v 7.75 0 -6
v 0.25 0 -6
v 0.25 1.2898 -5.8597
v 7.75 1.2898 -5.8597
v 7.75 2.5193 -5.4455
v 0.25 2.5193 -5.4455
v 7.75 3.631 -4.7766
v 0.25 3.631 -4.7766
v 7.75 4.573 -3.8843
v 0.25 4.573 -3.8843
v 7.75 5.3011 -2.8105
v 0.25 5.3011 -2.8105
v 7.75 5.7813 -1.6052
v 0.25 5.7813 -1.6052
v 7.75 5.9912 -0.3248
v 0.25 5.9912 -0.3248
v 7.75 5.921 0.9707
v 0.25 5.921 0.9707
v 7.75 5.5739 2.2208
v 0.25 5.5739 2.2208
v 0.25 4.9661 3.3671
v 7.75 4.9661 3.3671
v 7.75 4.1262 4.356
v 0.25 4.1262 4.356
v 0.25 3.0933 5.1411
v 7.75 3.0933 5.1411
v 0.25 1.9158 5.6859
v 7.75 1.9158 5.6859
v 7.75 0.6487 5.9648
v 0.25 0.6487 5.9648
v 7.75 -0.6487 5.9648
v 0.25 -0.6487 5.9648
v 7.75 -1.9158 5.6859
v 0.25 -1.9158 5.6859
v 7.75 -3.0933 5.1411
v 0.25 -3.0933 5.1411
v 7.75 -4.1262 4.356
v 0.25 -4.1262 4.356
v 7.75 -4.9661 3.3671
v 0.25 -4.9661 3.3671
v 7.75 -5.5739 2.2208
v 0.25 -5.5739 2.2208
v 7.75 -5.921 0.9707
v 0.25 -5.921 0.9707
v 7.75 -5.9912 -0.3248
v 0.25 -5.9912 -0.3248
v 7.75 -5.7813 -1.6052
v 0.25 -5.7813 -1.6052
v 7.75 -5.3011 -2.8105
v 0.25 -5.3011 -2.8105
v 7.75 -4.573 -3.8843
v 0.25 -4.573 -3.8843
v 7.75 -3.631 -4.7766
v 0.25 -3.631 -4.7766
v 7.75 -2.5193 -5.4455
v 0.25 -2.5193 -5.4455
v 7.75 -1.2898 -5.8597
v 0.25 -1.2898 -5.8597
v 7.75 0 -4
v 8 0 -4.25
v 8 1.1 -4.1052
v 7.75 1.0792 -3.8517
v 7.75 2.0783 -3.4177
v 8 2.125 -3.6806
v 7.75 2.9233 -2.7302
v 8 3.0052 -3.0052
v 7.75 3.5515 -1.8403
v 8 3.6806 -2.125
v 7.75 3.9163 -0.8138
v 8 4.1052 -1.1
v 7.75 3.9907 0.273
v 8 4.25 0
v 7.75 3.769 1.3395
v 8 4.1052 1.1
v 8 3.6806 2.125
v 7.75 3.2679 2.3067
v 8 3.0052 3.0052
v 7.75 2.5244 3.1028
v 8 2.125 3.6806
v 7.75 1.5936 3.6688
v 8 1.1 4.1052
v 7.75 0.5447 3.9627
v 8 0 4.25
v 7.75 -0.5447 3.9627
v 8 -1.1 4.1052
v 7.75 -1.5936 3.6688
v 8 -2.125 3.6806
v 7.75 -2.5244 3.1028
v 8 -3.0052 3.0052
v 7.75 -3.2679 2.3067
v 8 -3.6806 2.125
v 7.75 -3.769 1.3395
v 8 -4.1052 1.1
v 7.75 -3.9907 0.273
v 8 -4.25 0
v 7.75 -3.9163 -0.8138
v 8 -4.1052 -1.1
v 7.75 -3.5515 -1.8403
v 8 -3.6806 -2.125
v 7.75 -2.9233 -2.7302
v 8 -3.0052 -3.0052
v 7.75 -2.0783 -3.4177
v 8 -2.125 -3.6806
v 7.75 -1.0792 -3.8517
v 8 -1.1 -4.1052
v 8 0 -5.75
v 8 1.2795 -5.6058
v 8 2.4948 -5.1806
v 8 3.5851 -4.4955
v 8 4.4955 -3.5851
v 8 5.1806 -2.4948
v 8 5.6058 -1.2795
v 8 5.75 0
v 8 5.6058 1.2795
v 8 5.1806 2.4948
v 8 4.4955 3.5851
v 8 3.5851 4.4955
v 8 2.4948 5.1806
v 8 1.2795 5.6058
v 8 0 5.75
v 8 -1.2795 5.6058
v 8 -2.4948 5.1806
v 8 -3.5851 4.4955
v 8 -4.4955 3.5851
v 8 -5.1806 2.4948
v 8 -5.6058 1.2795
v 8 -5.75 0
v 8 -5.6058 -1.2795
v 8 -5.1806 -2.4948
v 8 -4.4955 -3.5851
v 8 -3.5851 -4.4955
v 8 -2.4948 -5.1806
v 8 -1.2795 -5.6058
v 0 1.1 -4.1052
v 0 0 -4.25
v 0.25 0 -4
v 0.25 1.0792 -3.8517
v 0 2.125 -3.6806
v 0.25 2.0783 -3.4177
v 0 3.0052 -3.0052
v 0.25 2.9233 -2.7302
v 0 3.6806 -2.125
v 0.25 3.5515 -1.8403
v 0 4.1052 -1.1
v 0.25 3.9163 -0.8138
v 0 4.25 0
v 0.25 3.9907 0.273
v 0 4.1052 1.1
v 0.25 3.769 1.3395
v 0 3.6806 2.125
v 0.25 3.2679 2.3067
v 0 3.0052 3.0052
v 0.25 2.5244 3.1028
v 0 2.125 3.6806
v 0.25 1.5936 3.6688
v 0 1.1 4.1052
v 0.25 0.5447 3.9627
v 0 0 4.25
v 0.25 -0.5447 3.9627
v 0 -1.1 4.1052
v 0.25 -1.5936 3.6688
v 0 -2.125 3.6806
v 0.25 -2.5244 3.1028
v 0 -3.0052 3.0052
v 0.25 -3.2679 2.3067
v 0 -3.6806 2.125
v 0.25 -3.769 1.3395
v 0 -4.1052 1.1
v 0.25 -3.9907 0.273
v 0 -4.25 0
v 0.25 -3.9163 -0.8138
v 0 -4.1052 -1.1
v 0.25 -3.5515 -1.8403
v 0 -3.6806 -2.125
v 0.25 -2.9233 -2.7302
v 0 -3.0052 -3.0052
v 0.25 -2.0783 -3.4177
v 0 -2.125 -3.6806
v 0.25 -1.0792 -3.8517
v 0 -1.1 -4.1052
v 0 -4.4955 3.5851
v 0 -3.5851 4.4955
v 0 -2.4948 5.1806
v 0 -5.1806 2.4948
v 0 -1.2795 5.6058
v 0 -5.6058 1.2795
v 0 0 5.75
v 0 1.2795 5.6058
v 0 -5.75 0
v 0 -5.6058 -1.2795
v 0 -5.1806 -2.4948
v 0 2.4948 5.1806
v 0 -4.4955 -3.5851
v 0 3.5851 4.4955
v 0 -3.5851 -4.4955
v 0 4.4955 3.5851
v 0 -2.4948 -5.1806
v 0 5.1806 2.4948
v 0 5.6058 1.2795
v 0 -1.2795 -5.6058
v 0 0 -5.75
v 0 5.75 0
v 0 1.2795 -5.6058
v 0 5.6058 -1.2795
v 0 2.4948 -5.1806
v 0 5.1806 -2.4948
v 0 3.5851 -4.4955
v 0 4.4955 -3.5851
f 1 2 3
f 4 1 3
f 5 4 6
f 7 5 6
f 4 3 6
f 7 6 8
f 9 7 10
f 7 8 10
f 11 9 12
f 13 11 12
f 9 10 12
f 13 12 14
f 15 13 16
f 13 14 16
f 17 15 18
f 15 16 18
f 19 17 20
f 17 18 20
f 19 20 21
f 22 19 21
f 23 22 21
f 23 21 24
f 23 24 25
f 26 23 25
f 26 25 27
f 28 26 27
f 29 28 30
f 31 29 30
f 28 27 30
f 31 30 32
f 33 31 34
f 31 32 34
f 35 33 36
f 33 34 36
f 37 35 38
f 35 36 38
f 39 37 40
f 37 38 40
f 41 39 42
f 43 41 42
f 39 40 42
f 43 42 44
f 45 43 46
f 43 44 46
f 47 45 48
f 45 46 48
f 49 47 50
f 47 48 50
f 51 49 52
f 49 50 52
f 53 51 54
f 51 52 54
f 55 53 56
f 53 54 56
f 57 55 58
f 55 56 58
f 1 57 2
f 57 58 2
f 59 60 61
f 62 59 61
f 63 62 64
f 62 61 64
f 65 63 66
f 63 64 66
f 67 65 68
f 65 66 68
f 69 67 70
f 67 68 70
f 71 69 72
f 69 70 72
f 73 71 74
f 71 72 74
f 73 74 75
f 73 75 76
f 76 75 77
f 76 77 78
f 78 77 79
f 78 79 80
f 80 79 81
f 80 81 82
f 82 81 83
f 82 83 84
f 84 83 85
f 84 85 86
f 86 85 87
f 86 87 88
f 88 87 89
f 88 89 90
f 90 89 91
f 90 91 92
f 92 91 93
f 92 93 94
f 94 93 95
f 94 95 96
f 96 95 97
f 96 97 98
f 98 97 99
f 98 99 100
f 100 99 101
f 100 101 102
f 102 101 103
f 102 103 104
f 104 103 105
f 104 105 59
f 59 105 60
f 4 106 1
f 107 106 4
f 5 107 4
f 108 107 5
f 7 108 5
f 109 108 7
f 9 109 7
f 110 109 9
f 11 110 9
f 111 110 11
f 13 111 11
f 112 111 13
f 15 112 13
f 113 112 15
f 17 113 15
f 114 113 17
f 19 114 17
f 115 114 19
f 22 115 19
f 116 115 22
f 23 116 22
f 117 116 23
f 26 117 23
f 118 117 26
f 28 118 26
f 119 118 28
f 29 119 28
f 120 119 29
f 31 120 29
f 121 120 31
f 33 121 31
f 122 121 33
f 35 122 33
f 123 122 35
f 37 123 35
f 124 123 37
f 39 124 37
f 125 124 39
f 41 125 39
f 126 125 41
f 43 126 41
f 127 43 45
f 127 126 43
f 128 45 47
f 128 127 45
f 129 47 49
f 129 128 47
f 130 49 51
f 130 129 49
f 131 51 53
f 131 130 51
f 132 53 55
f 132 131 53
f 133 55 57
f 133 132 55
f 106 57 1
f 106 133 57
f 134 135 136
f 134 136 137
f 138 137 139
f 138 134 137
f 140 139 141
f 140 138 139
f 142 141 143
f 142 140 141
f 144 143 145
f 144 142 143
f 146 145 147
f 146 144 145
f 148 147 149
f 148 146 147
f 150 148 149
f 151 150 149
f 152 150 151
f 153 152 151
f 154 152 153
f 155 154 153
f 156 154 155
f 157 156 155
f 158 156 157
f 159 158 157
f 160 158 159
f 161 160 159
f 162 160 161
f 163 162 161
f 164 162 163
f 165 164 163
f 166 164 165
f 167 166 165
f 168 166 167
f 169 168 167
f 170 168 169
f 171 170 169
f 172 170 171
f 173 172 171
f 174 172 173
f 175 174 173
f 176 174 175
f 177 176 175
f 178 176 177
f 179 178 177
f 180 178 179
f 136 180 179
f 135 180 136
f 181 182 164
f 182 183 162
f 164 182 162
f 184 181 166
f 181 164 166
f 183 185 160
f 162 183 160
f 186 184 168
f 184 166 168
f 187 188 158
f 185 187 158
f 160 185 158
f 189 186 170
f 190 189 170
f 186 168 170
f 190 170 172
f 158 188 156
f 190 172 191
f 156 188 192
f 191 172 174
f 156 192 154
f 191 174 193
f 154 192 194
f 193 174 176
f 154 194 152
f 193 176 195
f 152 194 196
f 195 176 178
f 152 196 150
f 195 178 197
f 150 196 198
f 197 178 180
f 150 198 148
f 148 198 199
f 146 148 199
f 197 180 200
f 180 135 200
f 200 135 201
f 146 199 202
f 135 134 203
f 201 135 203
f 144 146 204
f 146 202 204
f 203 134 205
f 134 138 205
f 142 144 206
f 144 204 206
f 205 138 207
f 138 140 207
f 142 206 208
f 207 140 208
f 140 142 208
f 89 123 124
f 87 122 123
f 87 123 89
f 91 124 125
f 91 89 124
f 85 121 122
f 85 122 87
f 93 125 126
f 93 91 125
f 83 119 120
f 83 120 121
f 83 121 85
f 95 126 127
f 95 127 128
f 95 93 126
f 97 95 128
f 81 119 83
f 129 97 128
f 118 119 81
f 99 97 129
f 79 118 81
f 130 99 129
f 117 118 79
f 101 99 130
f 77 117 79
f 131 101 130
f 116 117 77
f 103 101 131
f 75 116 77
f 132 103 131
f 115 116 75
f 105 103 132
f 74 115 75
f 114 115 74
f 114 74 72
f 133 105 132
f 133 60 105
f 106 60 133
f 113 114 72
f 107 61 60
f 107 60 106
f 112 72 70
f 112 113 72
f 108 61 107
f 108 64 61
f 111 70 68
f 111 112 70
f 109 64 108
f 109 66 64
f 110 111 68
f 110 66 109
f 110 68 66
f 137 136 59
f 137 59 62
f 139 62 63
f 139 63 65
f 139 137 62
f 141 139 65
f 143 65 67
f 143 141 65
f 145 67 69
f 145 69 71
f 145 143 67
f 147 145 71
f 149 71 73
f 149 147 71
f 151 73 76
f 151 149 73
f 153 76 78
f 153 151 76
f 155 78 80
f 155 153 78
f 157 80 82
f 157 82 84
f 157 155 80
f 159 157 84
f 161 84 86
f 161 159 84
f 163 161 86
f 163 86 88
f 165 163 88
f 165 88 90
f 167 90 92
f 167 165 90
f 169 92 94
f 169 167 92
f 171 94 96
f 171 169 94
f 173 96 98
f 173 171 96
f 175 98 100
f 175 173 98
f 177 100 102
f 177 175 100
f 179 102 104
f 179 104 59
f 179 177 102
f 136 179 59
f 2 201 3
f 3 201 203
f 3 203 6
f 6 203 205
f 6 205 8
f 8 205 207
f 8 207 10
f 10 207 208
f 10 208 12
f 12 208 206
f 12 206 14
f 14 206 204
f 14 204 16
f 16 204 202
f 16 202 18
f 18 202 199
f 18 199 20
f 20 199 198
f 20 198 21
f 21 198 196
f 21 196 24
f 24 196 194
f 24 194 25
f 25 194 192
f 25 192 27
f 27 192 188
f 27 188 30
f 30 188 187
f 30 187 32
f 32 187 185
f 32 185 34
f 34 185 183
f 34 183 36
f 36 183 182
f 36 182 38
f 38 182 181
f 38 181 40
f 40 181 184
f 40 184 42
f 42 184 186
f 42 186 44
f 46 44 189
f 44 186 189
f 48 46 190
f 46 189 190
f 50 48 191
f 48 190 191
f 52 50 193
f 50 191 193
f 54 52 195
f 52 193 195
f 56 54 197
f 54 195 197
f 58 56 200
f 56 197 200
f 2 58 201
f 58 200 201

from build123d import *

# Parameters (mm, degrees)
SKETCH1_R           = 6
SKETCH1_R_2         = 4
BOSS_EXTRUDE1_DEPTH = 8
CHAMFER1_SIZE       = 0.25


with BuildPart() as part:
    # Sketch1 → Boss-Extrude1 (new body)
    with BuildSketch(Plane(origin=(0, 0, 0), x_dir=(0, 0, -1), z_dir=(1, 0, 0))):
        Circle(SKETCH1_R)
        Circle(SKETCH1_R_2, mode=Mode.SUBTRACT)
    extrude(amount=BOSS_EXTRUDE1_DEPTH)

    # Chamfer1
    chamfer1_edges = [part.edges().sort_by_distance(p)[0] for p in [
        (0, 0, 6),
        (8, 0, 6),
        (0, 0, 4),
        (8, 0, 4),
    ]]
    chamfer(chamfer1_edges, length=CHAMFER1_SIZE)


solid = part.part
